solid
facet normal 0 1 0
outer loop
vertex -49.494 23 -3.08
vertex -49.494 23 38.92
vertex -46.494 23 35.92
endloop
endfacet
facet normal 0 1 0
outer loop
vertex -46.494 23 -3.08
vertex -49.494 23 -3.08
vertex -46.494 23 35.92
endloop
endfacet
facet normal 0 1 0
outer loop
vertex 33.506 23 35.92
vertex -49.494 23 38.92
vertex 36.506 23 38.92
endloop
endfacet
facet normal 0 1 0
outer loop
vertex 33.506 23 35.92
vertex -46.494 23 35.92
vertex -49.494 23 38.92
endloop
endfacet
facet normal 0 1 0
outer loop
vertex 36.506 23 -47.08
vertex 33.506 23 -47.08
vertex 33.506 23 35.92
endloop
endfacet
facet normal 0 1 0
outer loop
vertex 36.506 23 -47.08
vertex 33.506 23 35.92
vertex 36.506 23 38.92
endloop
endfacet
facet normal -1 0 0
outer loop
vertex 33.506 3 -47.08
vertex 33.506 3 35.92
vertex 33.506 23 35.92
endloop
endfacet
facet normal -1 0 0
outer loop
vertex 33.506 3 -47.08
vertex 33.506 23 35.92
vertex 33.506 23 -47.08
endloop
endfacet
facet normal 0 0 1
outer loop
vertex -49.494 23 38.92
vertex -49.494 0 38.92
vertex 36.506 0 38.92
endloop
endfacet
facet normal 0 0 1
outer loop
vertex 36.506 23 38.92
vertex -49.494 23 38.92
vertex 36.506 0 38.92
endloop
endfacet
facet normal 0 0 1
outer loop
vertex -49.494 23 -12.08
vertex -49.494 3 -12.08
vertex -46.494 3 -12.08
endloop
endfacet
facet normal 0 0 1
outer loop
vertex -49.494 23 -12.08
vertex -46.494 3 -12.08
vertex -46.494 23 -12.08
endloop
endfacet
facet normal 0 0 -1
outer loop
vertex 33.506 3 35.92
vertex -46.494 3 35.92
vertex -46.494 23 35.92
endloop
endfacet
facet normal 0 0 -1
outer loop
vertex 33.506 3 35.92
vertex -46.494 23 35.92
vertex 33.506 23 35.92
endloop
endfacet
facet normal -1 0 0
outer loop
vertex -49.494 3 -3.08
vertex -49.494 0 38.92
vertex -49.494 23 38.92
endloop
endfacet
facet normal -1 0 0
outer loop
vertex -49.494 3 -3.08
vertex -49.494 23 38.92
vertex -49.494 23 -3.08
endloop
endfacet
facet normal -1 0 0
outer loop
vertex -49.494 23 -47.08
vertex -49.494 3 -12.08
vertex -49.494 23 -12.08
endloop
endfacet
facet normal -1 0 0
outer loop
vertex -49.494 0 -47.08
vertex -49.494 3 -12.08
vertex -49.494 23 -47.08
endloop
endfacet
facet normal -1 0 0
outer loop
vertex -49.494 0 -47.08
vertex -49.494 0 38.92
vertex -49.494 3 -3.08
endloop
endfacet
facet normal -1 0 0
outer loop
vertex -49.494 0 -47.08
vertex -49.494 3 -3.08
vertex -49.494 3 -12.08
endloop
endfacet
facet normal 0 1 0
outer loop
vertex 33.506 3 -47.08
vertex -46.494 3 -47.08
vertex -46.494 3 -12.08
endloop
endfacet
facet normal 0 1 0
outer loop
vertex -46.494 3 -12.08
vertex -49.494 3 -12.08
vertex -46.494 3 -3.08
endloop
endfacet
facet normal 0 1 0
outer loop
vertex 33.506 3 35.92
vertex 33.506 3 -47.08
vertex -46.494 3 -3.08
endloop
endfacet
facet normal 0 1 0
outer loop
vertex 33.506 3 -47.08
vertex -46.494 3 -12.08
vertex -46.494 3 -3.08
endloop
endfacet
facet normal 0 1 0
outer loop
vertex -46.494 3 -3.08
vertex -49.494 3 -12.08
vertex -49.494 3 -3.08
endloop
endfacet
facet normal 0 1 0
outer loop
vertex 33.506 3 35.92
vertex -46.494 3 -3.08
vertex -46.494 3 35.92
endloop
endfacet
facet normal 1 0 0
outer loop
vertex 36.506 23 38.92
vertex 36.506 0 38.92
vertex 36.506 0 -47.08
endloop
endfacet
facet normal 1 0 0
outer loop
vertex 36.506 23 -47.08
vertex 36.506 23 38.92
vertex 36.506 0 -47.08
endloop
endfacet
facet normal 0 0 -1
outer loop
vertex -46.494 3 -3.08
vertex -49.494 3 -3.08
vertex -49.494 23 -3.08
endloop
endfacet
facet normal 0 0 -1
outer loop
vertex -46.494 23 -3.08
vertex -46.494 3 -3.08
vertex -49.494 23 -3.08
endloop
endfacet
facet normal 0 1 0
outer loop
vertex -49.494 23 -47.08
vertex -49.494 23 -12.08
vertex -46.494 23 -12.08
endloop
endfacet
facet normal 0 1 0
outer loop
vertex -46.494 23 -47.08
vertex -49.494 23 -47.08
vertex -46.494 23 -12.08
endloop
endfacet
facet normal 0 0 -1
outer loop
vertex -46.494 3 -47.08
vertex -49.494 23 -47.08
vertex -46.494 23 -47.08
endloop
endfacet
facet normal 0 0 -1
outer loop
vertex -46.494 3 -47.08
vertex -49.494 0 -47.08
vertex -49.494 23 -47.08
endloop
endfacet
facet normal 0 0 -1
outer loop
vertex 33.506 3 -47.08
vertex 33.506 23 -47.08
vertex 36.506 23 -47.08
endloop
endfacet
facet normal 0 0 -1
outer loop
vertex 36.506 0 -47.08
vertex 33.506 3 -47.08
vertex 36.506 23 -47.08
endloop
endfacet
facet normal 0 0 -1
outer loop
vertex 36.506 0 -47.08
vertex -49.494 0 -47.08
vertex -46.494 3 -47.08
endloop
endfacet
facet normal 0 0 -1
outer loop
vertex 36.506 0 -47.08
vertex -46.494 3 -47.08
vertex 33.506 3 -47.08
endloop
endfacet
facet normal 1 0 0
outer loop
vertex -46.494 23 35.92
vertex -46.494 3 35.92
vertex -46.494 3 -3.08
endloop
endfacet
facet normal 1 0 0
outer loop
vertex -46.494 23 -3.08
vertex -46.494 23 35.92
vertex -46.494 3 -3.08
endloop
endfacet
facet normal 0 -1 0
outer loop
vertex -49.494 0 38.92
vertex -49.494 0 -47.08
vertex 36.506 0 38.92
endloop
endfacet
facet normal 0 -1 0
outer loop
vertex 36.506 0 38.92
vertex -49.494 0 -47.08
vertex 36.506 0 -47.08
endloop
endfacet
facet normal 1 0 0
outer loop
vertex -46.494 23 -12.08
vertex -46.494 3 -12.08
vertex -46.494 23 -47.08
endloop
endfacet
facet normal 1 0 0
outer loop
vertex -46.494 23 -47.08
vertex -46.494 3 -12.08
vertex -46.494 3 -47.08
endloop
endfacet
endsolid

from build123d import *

# Parameters (mm, degrees)
SKETCH1_W           = 86
SKETCH1_H           = 86
BOSS_EXTRUDE1_DEPTH = 23
SHELL1_T            = -3
SKETCH2_W           = 9
SKETCH2_H           = 20
CUT_EXTRUDE1_DEPTH  = 3


with BuildPart() as part:
    # Sketch1 → Boss-Extrude1 (new body)
    with BuildSketch(Plane(origin=(0, 0, 0), x_dir=(1, 0, 0), z_dir=(0, 1, 0))):
        with Locations((-6.49444668, 4.080083427)):
            Rectangle(SKETCH1_W, SKETCH1_H)
    extrude(amount=BOSS_EXTRUDE1_DEPTH)

    # Shell1
    shell1_openings = [part.faces().sort_by_distance(p)[0] for p in [
        (-6.49444668, 23, -4.080083427),
        (-6.49444668, 11.5, -47.080083427),
    ]]
    offset(amount=SHELL1_T, openings=shell1_openings, kind=Kind.INTERSECTION)

    # Sketch2 → Cut-Extrude1 (cut)
    with BuildSketch(Plane.ZY.offset(49.49444668)):
        with Locations((-7.580083427, 13)):
            Rectangle(SKETCH2_W, SKETCH2_H)
    extrude(amount=-CUT_EXTRUDE1_DEPTH, mode=Mode.SUBTRACT)


solid = part.part
